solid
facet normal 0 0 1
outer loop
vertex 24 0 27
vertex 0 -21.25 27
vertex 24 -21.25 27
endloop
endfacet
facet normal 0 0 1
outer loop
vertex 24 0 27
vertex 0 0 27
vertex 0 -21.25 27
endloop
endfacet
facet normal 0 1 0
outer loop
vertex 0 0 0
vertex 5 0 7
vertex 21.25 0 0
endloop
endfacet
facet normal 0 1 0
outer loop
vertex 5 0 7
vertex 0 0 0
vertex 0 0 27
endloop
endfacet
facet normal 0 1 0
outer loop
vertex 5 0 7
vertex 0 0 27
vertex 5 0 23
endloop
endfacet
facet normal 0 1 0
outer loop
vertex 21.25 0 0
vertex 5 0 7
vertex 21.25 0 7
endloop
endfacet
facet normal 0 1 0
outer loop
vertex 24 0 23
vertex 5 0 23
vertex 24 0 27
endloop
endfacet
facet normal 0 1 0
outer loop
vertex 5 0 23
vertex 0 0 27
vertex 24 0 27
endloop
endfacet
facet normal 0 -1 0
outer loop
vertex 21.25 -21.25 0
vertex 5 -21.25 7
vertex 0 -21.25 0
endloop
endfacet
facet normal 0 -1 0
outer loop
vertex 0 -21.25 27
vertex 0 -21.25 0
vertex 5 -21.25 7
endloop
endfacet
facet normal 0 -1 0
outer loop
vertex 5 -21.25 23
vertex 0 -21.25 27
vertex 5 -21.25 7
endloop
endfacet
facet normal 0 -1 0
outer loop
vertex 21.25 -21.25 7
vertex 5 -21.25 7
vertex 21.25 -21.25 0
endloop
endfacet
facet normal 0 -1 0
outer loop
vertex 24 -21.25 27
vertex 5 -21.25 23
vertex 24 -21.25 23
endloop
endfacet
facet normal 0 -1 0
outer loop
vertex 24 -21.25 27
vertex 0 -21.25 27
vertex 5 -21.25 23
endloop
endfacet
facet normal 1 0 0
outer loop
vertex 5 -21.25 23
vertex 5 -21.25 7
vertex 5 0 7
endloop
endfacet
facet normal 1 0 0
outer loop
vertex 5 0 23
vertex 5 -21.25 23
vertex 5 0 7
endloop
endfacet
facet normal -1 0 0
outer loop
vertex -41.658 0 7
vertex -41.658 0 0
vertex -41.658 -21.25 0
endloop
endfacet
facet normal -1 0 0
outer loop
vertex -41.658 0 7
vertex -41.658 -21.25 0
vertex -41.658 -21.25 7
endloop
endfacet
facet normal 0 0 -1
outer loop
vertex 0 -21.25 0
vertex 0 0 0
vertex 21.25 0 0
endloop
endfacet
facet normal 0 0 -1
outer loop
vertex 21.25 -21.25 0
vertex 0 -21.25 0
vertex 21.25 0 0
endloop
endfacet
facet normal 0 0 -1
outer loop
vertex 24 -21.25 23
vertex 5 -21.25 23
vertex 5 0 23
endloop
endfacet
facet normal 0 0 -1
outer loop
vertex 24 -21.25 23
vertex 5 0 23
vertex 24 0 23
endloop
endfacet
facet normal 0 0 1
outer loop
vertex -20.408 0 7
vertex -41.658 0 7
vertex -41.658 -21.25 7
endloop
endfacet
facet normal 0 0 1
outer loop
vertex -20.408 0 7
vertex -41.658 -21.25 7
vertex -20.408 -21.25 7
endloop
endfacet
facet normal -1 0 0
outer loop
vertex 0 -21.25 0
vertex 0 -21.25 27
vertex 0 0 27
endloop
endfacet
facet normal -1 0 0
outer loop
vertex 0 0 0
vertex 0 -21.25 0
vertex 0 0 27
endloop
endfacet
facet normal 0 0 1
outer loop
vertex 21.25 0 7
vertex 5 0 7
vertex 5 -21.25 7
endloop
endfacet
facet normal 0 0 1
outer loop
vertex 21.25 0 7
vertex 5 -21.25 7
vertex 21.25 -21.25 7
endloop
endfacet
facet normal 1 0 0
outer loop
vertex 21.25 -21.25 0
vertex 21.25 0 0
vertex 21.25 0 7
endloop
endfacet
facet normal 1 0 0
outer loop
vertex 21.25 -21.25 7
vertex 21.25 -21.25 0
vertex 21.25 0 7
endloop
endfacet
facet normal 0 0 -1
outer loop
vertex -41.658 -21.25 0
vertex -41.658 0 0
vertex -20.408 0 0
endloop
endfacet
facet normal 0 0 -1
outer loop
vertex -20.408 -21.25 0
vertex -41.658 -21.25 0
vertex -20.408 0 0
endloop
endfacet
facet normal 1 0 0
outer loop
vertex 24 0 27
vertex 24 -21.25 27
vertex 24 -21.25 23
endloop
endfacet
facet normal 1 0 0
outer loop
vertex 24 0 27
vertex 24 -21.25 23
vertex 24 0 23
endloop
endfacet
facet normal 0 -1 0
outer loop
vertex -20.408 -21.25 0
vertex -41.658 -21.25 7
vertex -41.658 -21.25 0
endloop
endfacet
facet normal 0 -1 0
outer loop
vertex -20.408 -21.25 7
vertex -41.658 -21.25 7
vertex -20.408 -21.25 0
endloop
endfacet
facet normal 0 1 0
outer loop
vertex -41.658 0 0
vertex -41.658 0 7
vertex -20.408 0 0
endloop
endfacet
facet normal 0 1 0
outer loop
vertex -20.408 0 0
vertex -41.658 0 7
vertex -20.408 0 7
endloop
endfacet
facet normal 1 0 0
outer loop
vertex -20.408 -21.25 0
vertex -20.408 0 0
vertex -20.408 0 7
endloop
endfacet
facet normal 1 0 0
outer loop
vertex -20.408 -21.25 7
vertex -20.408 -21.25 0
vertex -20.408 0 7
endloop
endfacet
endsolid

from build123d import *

# Parameters (mm, degrees)
F0_W     = 21.25
F0_H     = 7
F1_DEPTH = 21.25
F2_W     = 5
F2_H     = 21.25
F3_DEPTH = 20
F4_W     = 19
F4_H     = 21.25
F5_DEPTH = 4
F6_W     = 21.25
F6_H     = 7
F7_DEPTH = 21.25


with BuildPart() as f1:
    # F0 (on Front) → F1 (new body)
    with BuildSketch(Plane.XZ):
        with Locations((10.625, 3.5)):
            Rectangle(F0_W, F0_H)
    extrude(amount=F1_DEPTH)

    # F2 (on face) → F3 (join)
    with BuildSketch(Plane.XY.offset(7)):
        with Locations((2.5, -10.625)):
            Rectangle(F2_W, F2_H)
    extrude(amount=F3_DEPTH)

    # F4 (on face) → F5 (join)
    with BuildSketch(Plane.XY.offset(27)):
        with Locations((14.5, -10.625)):
            Rectangle(F4_W, F4_H)
    extrude(amount=-F5_DEPTH)


with BuildPart() as f7:
    # F6 (on Front) → F7 (new body)
    with BuildSketch(Plane.XZ):
        with Locations((-31.032869, 3.5)):
            Rectangle(F6_W, F6_H)
    extrude(amount=F7_DEPTH)


solid = Compound([f1.part, f7.part])
